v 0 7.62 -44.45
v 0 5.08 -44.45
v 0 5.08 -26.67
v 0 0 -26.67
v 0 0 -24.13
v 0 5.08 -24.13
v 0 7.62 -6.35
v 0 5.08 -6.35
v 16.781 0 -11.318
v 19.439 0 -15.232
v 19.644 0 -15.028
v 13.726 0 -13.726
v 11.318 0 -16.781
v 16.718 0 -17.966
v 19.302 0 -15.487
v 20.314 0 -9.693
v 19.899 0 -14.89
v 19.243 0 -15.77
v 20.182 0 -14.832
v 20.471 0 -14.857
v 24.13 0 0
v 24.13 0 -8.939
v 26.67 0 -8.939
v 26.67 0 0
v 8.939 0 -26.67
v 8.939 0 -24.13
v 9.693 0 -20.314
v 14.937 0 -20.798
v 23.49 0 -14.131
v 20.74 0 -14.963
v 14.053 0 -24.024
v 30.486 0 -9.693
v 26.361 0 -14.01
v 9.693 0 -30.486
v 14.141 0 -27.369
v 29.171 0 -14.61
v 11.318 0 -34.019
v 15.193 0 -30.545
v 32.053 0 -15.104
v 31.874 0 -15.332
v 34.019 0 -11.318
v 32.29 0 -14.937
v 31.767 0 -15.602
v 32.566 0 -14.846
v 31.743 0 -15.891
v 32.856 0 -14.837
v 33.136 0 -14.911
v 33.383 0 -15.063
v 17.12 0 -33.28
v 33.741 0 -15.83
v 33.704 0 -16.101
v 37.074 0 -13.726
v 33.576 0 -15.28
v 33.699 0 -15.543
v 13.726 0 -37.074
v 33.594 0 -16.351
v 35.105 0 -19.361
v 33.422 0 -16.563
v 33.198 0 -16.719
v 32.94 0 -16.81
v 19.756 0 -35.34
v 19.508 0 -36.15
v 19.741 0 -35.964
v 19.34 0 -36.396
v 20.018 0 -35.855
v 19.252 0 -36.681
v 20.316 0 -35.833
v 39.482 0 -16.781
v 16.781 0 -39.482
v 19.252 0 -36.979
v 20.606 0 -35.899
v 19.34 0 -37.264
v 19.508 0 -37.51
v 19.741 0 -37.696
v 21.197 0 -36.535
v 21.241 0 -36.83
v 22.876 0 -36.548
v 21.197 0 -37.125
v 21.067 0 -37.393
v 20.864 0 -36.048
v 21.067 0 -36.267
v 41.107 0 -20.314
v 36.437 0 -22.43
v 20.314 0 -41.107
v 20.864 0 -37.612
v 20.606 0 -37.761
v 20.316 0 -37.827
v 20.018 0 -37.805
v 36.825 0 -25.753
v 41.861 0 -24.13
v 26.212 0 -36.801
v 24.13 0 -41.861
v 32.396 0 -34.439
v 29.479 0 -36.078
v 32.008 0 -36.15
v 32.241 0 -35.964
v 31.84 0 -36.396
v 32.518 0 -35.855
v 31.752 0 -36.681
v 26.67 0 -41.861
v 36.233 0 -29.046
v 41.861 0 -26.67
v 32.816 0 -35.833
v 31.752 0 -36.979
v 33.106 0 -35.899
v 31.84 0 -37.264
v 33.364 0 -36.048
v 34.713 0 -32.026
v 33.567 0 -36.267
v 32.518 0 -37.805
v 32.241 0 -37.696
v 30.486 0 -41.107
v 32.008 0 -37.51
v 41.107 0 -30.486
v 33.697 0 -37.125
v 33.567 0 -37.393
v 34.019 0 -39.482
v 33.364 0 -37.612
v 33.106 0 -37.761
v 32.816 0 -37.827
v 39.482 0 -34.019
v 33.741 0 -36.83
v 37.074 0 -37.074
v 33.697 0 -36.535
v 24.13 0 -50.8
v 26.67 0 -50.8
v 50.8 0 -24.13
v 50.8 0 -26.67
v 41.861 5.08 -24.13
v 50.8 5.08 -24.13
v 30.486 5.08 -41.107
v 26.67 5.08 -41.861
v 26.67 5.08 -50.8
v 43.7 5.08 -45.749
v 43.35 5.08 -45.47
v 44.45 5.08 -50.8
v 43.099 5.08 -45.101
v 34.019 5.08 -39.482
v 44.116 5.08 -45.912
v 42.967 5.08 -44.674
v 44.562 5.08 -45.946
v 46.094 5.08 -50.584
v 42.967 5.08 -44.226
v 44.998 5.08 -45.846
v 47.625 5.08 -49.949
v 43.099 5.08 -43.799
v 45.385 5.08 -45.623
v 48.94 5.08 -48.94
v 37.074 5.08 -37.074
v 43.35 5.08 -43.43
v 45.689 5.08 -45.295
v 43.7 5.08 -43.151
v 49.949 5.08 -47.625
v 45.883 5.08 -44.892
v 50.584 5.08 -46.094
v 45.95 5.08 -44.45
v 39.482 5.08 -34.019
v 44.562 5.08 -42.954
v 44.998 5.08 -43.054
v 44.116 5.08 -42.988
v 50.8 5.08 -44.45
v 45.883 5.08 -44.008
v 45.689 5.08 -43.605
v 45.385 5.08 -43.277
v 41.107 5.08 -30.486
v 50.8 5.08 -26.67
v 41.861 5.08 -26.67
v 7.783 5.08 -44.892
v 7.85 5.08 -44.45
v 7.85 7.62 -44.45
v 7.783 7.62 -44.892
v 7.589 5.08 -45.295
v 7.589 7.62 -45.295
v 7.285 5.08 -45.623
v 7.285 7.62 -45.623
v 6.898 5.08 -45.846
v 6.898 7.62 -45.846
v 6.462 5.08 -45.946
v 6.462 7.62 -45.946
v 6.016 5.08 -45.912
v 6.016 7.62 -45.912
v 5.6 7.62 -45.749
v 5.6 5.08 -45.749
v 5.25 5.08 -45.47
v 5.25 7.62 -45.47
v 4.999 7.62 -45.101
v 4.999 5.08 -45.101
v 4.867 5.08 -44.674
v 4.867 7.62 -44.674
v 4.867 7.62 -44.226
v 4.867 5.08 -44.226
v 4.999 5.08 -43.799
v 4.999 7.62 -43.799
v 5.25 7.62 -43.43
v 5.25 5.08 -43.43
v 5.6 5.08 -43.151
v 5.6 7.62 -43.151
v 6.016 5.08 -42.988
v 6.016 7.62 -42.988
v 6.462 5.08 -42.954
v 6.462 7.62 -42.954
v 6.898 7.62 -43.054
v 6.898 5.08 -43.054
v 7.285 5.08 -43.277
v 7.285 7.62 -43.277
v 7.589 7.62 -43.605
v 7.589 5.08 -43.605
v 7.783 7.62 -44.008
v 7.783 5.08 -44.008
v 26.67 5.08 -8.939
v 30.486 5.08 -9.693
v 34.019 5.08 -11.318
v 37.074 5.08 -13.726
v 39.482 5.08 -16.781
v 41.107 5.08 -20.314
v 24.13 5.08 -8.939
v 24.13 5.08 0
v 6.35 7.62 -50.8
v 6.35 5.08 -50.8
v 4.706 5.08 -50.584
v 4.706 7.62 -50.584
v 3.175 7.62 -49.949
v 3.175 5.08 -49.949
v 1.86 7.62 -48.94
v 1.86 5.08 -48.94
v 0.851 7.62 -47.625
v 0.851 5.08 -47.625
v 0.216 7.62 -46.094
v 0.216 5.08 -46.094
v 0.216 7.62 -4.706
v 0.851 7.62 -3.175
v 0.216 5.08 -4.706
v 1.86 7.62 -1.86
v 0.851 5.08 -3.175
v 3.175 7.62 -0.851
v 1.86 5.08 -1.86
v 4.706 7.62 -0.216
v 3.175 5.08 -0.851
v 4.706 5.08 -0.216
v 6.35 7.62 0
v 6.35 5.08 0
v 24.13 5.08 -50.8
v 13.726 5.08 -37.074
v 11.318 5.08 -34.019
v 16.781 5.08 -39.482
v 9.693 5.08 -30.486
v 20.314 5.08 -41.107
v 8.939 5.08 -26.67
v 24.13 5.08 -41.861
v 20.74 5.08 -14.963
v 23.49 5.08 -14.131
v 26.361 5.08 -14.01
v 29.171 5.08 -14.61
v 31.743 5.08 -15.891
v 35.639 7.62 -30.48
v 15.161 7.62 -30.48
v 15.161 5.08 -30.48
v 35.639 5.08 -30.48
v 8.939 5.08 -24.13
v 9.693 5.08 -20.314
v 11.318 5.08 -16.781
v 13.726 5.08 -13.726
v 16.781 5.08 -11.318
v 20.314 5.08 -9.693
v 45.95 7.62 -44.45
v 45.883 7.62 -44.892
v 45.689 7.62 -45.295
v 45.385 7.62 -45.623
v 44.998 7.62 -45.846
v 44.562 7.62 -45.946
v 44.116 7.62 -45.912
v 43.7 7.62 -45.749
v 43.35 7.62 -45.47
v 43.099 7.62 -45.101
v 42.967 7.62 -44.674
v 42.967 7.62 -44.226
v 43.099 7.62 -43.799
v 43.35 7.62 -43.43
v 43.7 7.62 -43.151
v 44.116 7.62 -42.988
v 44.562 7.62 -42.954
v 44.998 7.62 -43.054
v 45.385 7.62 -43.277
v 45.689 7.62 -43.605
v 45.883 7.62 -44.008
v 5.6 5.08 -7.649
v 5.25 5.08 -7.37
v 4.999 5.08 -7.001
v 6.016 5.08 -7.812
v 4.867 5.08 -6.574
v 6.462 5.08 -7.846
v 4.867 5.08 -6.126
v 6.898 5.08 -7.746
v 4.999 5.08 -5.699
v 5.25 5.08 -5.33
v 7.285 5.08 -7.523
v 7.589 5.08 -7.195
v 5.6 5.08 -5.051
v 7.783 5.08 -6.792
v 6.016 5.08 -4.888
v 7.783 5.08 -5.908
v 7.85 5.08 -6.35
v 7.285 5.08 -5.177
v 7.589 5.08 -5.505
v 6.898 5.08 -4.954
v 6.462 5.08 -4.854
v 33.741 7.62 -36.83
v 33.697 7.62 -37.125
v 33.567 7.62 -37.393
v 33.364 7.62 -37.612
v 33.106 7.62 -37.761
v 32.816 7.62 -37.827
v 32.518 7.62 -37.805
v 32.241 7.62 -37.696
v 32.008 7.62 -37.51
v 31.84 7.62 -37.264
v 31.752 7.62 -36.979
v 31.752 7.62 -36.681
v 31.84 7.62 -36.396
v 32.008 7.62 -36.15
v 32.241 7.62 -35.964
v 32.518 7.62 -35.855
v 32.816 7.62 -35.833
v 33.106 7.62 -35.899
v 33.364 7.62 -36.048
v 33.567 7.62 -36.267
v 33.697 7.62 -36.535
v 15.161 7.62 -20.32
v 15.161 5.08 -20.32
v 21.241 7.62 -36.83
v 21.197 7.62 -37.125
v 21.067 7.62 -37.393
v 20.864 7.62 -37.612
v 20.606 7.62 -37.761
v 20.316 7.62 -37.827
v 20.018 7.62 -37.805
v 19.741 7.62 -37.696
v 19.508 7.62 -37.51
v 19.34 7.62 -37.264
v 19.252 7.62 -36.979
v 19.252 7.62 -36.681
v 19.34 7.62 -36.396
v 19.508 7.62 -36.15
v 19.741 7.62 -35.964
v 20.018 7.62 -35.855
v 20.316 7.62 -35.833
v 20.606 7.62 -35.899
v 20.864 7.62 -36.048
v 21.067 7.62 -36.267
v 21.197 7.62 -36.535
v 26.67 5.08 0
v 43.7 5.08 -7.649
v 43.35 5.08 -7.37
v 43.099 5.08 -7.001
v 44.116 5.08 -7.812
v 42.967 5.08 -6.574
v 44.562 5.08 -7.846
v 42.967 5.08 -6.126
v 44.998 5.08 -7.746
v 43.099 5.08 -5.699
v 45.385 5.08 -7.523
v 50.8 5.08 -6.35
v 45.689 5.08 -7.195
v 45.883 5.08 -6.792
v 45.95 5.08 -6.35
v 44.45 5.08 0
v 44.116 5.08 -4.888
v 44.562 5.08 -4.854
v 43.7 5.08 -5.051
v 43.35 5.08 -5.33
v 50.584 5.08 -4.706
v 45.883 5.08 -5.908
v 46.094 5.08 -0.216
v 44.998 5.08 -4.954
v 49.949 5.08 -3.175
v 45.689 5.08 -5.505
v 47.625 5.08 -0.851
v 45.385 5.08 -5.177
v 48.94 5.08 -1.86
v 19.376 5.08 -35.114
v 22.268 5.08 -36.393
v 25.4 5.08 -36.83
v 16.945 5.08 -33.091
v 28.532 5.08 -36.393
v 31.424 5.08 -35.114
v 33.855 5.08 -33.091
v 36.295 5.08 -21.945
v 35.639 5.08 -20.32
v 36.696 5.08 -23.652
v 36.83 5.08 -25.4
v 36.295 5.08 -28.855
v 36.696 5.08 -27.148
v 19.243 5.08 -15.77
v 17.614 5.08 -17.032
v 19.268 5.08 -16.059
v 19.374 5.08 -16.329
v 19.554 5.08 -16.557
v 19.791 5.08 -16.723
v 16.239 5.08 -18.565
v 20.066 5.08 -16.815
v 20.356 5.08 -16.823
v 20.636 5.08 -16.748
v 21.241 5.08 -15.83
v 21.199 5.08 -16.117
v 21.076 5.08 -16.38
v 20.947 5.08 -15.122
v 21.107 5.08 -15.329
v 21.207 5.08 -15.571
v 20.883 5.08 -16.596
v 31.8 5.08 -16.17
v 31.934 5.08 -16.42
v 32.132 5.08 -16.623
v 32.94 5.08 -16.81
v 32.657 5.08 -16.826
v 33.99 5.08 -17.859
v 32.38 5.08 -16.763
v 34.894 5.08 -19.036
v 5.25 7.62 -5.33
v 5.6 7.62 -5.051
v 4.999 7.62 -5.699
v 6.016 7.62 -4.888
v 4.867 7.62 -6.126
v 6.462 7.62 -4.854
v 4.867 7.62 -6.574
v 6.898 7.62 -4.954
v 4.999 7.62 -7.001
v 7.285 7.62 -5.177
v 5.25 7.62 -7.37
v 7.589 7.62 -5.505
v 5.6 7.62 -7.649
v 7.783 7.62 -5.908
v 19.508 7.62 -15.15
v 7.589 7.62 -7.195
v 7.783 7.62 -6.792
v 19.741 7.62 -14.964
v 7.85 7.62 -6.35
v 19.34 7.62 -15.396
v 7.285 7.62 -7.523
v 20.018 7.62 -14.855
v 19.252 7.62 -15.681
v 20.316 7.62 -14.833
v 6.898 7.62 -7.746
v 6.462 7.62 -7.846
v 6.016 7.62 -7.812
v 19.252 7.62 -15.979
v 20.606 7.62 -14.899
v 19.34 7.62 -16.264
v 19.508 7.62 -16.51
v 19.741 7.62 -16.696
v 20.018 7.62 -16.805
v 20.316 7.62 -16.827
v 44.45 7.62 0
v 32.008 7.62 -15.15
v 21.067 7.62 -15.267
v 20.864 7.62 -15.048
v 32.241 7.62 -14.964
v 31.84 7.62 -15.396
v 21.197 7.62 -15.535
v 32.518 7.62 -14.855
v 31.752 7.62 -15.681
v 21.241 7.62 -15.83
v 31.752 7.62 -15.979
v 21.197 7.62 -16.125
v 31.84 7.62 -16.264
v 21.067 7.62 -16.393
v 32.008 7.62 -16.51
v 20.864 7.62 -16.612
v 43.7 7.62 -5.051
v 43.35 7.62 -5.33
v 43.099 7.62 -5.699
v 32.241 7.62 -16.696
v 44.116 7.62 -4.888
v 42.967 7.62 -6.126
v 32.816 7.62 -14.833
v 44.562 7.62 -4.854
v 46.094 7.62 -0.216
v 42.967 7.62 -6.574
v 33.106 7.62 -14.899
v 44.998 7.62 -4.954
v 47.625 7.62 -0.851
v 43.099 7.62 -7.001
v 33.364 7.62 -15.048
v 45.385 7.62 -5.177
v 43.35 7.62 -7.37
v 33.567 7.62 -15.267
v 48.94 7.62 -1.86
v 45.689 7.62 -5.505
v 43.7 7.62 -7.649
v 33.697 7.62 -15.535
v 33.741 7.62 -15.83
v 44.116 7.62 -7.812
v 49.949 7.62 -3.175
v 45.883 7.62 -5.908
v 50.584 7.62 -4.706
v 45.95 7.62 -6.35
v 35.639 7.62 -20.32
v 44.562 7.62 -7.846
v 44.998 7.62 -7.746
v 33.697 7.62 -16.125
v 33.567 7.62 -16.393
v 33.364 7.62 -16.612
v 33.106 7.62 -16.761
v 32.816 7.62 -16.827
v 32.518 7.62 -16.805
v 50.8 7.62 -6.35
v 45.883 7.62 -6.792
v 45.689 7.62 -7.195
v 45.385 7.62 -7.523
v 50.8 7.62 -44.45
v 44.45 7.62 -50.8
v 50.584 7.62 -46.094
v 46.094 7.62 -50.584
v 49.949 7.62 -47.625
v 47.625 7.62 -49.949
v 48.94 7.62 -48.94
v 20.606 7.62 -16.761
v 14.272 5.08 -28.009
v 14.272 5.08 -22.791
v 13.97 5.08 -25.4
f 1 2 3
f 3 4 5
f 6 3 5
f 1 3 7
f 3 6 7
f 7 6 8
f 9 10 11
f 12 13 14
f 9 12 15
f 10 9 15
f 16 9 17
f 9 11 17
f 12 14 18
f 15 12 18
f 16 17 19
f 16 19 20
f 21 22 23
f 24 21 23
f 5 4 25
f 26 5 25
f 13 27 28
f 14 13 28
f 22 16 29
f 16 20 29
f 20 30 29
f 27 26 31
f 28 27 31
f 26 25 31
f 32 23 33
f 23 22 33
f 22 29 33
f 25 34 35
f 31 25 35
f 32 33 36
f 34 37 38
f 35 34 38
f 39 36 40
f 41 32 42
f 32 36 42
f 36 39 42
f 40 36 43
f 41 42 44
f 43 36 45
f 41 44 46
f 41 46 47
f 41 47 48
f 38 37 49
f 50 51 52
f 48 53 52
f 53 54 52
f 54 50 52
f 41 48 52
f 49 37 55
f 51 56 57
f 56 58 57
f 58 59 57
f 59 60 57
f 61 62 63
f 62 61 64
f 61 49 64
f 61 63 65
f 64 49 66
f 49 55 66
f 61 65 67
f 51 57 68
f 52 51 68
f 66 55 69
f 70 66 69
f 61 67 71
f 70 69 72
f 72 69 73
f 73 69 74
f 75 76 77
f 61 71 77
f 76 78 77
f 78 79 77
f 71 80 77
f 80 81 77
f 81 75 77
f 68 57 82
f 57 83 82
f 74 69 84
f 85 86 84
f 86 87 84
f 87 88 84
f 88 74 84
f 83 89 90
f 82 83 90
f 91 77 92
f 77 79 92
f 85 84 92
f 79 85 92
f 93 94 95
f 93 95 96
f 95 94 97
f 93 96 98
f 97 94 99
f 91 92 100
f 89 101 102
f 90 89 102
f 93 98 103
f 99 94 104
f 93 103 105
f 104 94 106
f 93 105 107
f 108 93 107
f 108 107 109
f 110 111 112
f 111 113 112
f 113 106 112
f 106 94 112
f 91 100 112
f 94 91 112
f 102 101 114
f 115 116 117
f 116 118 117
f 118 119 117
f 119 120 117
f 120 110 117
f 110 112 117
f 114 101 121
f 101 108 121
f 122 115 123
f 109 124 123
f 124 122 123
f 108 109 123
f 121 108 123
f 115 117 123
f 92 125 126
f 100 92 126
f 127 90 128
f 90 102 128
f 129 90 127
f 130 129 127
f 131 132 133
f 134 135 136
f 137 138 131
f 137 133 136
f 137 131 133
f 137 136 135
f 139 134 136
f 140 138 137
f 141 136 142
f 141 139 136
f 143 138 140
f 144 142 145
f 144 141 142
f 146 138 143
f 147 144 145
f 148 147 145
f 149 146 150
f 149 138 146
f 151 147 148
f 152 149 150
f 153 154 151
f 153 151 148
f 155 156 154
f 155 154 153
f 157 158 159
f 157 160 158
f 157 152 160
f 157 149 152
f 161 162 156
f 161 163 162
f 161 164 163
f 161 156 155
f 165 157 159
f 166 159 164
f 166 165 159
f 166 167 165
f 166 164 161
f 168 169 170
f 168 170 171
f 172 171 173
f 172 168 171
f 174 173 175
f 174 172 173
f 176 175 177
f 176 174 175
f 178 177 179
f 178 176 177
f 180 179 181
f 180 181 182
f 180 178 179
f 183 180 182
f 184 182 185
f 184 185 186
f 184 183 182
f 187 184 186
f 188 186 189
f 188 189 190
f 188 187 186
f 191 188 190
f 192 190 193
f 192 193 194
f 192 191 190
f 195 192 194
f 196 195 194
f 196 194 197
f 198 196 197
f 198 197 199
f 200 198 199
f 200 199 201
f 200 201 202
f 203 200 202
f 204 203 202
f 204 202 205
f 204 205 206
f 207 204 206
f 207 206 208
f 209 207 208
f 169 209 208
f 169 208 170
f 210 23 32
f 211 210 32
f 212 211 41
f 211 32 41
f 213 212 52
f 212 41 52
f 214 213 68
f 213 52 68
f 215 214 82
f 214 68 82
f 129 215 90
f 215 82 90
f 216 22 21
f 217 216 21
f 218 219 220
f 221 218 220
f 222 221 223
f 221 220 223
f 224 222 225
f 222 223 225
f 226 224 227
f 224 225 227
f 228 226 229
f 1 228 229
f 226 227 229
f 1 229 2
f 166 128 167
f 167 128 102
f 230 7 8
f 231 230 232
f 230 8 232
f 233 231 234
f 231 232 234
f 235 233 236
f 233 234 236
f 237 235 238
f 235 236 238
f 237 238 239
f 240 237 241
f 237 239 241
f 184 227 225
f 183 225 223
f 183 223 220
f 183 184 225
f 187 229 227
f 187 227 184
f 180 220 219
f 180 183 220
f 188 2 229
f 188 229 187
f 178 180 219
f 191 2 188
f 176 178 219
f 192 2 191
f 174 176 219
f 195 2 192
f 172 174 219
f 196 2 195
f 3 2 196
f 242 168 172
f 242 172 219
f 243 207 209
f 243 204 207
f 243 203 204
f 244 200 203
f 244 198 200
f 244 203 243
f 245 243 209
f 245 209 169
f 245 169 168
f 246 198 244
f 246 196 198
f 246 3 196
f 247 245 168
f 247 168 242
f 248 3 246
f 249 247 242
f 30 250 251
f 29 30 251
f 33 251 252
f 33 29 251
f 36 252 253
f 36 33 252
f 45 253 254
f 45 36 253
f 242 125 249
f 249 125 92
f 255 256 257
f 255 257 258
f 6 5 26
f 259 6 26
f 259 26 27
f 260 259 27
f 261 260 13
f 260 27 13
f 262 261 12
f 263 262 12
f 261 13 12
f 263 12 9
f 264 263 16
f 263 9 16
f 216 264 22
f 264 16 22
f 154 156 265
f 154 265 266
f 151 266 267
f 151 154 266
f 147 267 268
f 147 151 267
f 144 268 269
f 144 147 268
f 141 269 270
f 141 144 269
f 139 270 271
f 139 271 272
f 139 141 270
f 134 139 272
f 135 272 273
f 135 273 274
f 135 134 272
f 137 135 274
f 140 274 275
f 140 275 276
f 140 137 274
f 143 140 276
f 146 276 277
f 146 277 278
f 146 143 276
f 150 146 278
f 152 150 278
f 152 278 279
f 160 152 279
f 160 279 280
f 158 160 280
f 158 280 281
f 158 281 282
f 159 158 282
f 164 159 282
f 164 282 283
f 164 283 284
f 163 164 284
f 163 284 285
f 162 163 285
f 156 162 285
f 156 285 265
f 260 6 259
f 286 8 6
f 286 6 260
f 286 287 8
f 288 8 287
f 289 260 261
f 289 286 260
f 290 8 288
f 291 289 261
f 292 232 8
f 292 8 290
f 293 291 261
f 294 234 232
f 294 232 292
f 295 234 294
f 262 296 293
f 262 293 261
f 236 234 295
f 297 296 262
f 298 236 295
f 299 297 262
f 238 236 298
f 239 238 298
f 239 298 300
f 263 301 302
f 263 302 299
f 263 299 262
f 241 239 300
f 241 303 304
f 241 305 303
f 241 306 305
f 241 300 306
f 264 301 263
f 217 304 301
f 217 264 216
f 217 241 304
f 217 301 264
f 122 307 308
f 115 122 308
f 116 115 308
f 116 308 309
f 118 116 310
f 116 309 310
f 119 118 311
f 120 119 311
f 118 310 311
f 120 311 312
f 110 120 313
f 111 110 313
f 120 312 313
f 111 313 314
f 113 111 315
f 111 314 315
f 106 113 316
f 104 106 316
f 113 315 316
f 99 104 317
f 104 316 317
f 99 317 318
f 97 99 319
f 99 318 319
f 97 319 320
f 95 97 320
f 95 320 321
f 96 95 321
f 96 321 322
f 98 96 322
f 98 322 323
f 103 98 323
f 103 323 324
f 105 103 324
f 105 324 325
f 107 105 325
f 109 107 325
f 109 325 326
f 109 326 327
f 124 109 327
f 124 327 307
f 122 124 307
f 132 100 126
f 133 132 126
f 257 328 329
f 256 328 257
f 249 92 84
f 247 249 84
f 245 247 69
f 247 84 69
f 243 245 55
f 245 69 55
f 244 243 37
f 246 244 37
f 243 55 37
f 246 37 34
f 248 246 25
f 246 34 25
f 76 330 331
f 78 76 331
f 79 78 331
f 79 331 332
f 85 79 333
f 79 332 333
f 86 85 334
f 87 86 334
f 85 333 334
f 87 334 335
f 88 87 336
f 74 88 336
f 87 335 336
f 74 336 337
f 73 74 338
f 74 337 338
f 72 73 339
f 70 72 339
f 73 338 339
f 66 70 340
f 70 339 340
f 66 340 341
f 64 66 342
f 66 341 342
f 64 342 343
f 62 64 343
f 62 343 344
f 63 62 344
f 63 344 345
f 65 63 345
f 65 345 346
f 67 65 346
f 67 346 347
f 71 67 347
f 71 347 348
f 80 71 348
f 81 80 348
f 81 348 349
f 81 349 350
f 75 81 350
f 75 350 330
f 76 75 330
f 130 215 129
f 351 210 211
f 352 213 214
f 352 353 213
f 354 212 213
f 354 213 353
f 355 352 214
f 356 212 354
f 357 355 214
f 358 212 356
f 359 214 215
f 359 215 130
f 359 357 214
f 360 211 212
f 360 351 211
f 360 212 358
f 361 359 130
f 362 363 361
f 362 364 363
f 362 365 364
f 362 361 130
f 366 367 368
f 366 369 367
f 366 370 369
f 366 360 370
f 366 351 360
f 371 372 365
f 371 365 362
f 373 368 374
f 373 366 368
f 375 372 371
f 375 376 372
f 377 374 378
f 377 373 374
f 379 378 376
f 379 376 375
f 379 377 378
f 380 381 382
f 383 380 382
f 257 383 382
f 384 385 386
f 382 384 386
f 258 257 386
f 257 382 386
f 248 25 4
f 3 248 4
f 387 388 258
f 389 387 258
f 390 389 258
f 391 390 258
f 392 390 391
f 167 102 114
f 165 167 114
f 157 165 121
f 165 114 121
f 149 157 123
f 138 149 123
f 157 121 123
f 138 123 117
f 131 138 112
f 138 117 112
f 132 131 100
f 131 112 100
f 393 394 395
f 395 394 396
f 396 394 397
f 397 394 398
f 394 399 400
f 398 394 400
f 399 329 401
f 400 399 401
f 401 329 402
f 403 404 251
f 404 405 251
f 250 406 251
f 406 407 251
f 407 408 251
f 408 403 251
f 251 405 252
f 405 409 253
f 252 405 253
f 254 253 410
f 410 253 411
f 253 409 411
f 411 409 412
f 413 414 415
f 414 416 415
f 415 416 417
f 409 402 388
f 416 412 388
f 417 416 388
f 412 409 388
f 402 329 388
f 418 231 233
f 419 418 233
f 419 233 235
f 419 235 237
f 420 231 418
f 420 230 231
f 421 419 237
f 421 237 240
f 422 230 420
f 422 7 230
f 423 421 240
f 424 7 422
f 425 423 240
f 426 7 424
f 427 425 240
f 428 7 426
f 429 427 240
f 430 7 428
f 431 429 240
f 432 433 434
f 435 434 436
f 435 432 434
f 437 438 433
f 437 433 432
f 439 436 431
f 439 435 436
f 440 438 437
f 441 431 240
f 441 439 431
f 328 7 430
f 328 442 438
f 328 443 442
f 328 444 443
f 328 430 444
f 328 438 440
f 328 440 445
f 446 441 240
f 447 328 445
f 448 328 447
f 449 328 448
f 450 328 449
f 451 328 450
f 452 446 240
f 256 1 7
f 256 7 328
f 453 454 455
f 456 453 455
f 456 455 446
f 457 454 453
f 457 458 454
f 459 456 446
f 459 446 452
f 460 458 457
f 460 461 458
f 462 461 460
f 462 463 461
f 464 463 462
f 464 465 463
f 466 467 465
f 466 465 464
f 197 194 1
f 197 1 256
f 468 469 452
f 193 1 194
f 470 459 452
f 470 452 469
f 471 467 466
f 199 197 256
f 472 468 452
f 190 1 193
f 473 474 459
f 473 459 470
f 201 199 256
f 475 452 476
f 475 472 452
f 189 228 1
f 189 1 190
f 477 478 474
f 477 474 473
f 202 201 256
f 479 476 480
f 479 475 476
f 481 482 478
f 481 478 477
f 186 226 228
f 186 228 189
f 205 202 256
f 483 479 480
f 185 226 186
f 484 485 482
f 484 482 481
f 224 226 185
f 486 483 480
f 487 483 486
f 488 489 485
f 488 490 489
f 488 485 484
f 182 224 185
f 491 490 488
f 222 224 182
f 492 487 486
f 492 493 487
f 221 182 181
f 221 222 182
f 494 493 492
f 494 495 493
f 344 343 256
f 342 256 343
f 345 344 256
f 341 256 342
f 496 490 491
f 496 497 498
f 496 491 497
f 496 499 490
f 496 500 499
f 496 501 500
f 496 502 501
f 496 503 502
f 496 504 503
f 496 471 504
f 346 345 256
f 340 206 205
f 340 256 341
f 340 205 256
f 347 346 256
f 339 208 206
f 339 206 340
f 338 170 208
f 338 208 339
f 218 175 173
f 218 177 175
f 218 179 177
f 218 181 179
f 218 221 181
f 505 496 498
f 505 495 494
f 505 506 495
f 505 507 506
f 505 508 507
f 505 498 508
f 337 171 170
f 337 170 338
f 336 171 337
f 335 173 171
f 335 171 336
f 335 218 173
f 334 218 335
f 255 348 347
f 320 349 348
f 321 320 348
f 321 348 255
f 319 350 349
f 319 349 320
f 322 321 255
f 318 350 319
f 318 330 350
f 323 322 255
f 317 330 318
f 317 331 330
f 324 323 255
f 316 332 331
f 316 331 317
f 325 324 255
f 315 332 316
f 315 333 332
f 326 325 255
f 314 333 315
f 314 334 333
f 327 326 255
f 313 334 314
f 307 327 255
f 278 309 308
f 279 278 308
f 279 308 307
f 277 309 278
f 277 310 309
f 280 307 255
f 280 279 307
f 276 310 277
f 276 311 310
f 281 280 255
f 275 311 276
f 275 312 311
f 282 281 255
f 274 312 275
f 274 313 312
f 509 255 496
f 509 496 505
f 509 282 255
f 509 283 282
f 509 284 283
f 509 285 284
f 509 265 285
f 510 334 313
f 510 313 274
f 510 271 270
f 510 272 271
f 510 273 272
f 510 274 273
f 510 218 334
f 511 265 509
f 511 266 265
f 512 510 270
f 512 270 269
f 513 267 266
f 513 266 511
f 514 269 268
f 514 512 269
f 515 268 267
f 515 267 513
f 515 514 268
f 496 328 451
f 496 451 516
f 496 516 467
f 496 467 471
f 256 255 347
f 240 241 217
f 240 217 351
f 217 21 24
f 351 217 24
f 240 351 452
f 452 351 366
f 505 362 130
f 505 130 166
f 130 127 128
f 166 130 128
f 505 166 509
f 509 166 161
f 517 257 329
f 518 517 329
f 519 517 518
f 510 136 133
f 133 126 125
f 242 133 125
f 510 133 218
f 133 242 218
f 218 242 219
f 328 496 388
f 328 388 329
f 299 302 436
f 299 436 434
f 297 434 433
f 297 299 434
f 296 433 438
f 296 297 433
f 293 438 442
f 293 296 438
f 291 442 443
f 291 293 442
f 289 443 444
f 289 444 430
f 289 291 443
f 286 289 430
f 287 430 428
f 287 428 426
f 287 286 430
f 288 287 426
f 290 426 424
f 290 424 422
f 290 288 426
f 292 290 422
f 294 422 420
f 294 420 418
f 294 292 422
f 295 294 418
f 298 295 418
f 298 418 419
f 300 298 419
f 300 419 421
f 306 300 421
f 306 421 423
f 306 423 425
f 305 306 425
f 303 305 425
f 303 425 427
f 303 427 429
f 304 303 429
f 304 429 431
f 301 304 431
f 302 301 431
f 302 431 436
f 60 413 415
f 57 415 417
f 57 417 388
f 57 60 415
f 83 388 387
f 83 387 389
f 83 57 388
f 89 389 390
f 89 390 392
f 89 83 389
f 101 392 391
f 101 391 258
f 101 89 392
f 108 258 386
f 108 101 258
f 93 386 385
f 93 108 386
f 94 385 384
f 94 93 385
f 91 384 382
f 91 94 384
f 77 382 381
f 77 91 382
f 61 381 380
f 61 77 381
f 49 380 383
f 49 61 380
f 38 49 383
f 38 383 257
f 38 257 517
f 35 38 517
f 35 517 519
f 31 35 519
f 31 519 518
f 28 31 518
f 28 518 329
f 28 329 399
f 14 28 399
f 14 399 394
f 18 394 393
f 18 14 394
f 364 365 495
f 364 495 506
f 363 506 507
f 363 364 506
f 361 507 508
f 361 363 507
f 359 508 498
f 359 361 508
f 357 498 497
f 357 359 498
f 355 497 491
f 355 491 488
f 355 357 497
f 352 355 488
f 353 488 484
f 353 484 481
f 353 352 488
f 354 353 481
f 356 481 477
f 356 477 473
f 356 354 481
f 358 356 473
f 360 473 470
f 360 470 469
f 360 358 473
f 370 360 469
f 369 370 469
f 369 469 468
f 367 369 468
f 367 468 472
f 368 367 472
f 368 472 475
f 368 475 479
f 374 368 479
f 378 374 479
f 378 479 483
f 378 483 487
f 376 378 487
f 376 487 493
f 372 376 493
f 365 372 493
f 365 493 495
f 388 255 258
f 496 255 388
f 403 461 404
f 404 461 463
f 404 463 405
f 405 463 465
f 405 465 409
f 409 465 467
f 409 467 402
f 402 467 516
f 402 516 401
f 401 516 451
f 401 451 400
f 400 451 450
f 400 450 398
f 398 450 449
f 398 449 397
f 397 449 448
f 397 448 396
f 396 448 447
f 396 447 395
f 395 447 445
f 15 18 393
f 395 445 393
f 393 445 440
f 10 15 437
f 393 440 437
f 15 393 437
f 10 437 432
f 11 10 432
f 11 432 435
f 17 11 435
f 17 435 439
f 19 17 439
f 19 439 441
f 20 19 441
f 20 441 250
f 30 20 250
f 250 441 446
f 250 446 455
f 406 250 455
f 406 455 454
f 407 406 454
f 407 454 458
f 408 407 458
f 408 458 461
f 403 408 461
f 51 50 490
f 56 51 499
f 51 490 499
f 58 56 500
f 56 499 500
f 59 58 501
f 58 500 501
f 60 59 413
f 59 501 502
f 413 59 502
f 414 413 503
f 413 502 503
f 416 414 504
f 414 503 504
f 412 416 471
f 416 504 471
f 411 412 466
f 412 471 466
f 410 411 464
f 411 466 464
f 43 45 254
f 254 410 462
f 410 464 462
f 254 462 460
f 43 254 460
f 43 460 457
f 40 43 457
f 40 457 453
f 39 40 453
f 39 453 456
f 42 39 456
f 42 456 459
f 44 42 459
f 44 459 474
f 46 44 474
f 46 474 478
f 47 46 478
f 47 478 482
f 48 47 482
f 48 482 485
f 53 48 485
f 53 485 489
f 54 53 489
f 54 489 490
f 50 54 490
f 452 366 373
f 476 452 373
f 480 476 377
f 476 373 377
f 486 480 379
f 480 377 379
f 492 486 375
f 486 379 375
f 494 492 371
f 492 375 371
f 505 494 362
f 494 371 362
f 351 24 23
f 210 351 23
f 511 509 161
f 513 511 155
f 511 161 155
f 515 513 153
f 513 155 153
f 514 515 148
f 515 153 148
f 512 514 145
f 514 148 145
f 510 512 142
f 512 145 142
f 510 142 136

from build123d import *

# Parameters (mm, degrees)
SKETCH1_R           = 1.5
SKETCH1_R_2         = 11.43
BOSS_EXTRUDE1_DEPTH = 7.62
CUT_EXTRUDE1_DEPTH  = 5.08
BOSS_EXTRUDE2_DEPTH = 2.54
SKETCH4_R           = 1
CUT_EXTRUDE2_DEPTH  = 8.62


with BuildPart() as part:
    # Sketch1 → Boss-Extrude1 (new body)
    with BuildSketch(Plane(origin=(0, 0, 0), x_dir=(1, 0, 0), z_dir=(0, 1, 0))):
        with BuildLine():
            Line((6.35, 0), (44.45, 0))
            ThreePointArc((44.45, 0), (48.940128061, 1.859871939), (50.8, 6.35))
            Line((50.8, 6.35), (50.8, 44.45))
            ThreePointArc((50.8, 44.45), (48.940128061, 48.940128061), (44.45, 50.8))
            Line((44.45, 50.8), (6.35, 50.8))
            ThreePointArc((6.35, 50.8), (1.859871939, 48.940128061), (0, 44.45))
            Line((0, 44.45), (0, 6.35))
            ThreePointArc((0, 6.35), (1.859871939, 1.859871939), (6.35, 0))
        make_face()
        with Locations((6.35, 6.35)):
            Circle(SKETCH1_R, mode=Mode.SUBTRACT)
        with Locations((6.35, 44.45)):
            Circle(SKETCH1_R, mode=Mode.SUBTRACT)
        with Locations((44.45, 44.45)):
            Circle(SKETCH1_R, mode=Mode.SUBTRACT)
        with Locations((44.45, 6.35)):
            Circle(SKETCH1_R, mode=Mode.SUBTRACT)
        with Locations((25.4, 25.4)):
            Circle(SKETCH1_R_2, mode=Mode.SUBTRACT)
    extrude(amount=BOSS_EXTRUDE1_DEPTH)

    # Sketch2 → Cut-Extrude1 (cut)
    with BuildSketch(Plane.XZ):
        with BuildLine():
            Line((8.938918626, -26.67), (0, -26.67))
            Line((0, -26.67), (0, -50.8))
            Line((0, -50.8), (24.13, -50.8))
            Line((24.13, -50.8), (24.13, -41.861081374))
            ThreePointArc((24.13, -41.861081374), (13.725667043, -37.074332957), (8.938918626, -26.67))
        make_face()
        with BuildLine():
            Line((0, 0), (0, -24.13))
            Line((0, -24.13), (8.938918626, -24.13))
            ThreePointArc((8.938918626, -24.13), (13.725667043, -13.725667043), (24.13, -8.938918626))
            Line((24.13, -8.938918626), (24.13, 0))
            Line((24.13, 0), (0, 0))
        make_face()
        with BuildLine():
            ThreePointArc((41.861081374, -26.67), (37.074332957, -37.074332957), (26.67, -41.861081374))
            Line((26.67, -41.861081374), (26.67, -50.8))
            Line((26.67, -50.8), (50.8, -50.8))
            Line((50.8, -50.8), (50.8, -26.67))
            Line((50.8, -26.67), (41.861081374, -26.67))
        make_face()
        with BuildLine():
            Line((26.67, 0), (26.67, -8.938918626))
            ThreePointArc((26.67, -8.938918626), (37.074332957, -13.725667043), (41.861081374, -24.13))
            Line((41.861081374, -24.13), (50.8, -24.13))
            Line((50.8, -24.13), (50.8, 0))
            Line((50.8, 0), (26.67, 0))
        make_face()
    extrude(amount=-CUT_EXTRUDE1_DEPTH, mode=Mode.SUBTRACT)

    # Sketch3 → Boss-Extrude2 (add)
    with BuildSketch(Plane(origin=(0, 7.62, 0), x_dir=(1, 0, 0), z_dir=(0, 1, 0))):
        with BuildLine():
            Line((35.63906734, 20.32), (15.16093266, 20.32))
            ThreePointArc((15.16093266, 20.32), (25.4, 13.97), (35.63906734, 20.32))
        make_face()
        with BuildLine():
            ThreePointArc((15.16093266, 30.48), (13.97, 25.4), (15.16093266, 20.32))
            Line((15.16093266, 20.32), (15.16093266, 30.48))
        make_face()
        with BuildLine():
            ThreePointArc((35.63906734, 30.48), (25.4, 36.83), (15.16093266, 30.48))
            Line((15.16093266, 30.48), (35.63906734, 30.48))
        make_face()
        with BuildLine():
            Line((35.63906734, 30.48), (35.63906734, 20.32))
            ThreePointArc((35.63906734, 20.32), (36.528284677, 22.791134317), (36.83, 25.4))
            ThreePointArc((36.83, 25.4), (36.528284677, 28.008865683), (35.63906734, 30.48))
        make_face()
    extrude(amount=-BOSS_EXTRUDE2_DEPTH)

    # Sketch4 → Cut-Extrude2 (cut, through all)
    with BuildSketch(Plane(origin=(0, 7.62, 0), x_dir=(1, 0, 0), z_dir=(0, 1, 0))):
        with Locations((20.24093266, 36.83)):
            Circle(SKETCH4_R)
        with Locations((32.74093266, 36.83)):
            Circle(SKETCH4_R)
        with Locations((20.24093266, 15.83)):
            Circle(SKETCH4_R)
        with Locations((32.74093266, 15.83)):
            Circle(SKETCH4_R)
    extrude(amount=-CUT_EXTRUDE2_DEPTH, mode=Mode.SUBTRACT)


solid = part.part
